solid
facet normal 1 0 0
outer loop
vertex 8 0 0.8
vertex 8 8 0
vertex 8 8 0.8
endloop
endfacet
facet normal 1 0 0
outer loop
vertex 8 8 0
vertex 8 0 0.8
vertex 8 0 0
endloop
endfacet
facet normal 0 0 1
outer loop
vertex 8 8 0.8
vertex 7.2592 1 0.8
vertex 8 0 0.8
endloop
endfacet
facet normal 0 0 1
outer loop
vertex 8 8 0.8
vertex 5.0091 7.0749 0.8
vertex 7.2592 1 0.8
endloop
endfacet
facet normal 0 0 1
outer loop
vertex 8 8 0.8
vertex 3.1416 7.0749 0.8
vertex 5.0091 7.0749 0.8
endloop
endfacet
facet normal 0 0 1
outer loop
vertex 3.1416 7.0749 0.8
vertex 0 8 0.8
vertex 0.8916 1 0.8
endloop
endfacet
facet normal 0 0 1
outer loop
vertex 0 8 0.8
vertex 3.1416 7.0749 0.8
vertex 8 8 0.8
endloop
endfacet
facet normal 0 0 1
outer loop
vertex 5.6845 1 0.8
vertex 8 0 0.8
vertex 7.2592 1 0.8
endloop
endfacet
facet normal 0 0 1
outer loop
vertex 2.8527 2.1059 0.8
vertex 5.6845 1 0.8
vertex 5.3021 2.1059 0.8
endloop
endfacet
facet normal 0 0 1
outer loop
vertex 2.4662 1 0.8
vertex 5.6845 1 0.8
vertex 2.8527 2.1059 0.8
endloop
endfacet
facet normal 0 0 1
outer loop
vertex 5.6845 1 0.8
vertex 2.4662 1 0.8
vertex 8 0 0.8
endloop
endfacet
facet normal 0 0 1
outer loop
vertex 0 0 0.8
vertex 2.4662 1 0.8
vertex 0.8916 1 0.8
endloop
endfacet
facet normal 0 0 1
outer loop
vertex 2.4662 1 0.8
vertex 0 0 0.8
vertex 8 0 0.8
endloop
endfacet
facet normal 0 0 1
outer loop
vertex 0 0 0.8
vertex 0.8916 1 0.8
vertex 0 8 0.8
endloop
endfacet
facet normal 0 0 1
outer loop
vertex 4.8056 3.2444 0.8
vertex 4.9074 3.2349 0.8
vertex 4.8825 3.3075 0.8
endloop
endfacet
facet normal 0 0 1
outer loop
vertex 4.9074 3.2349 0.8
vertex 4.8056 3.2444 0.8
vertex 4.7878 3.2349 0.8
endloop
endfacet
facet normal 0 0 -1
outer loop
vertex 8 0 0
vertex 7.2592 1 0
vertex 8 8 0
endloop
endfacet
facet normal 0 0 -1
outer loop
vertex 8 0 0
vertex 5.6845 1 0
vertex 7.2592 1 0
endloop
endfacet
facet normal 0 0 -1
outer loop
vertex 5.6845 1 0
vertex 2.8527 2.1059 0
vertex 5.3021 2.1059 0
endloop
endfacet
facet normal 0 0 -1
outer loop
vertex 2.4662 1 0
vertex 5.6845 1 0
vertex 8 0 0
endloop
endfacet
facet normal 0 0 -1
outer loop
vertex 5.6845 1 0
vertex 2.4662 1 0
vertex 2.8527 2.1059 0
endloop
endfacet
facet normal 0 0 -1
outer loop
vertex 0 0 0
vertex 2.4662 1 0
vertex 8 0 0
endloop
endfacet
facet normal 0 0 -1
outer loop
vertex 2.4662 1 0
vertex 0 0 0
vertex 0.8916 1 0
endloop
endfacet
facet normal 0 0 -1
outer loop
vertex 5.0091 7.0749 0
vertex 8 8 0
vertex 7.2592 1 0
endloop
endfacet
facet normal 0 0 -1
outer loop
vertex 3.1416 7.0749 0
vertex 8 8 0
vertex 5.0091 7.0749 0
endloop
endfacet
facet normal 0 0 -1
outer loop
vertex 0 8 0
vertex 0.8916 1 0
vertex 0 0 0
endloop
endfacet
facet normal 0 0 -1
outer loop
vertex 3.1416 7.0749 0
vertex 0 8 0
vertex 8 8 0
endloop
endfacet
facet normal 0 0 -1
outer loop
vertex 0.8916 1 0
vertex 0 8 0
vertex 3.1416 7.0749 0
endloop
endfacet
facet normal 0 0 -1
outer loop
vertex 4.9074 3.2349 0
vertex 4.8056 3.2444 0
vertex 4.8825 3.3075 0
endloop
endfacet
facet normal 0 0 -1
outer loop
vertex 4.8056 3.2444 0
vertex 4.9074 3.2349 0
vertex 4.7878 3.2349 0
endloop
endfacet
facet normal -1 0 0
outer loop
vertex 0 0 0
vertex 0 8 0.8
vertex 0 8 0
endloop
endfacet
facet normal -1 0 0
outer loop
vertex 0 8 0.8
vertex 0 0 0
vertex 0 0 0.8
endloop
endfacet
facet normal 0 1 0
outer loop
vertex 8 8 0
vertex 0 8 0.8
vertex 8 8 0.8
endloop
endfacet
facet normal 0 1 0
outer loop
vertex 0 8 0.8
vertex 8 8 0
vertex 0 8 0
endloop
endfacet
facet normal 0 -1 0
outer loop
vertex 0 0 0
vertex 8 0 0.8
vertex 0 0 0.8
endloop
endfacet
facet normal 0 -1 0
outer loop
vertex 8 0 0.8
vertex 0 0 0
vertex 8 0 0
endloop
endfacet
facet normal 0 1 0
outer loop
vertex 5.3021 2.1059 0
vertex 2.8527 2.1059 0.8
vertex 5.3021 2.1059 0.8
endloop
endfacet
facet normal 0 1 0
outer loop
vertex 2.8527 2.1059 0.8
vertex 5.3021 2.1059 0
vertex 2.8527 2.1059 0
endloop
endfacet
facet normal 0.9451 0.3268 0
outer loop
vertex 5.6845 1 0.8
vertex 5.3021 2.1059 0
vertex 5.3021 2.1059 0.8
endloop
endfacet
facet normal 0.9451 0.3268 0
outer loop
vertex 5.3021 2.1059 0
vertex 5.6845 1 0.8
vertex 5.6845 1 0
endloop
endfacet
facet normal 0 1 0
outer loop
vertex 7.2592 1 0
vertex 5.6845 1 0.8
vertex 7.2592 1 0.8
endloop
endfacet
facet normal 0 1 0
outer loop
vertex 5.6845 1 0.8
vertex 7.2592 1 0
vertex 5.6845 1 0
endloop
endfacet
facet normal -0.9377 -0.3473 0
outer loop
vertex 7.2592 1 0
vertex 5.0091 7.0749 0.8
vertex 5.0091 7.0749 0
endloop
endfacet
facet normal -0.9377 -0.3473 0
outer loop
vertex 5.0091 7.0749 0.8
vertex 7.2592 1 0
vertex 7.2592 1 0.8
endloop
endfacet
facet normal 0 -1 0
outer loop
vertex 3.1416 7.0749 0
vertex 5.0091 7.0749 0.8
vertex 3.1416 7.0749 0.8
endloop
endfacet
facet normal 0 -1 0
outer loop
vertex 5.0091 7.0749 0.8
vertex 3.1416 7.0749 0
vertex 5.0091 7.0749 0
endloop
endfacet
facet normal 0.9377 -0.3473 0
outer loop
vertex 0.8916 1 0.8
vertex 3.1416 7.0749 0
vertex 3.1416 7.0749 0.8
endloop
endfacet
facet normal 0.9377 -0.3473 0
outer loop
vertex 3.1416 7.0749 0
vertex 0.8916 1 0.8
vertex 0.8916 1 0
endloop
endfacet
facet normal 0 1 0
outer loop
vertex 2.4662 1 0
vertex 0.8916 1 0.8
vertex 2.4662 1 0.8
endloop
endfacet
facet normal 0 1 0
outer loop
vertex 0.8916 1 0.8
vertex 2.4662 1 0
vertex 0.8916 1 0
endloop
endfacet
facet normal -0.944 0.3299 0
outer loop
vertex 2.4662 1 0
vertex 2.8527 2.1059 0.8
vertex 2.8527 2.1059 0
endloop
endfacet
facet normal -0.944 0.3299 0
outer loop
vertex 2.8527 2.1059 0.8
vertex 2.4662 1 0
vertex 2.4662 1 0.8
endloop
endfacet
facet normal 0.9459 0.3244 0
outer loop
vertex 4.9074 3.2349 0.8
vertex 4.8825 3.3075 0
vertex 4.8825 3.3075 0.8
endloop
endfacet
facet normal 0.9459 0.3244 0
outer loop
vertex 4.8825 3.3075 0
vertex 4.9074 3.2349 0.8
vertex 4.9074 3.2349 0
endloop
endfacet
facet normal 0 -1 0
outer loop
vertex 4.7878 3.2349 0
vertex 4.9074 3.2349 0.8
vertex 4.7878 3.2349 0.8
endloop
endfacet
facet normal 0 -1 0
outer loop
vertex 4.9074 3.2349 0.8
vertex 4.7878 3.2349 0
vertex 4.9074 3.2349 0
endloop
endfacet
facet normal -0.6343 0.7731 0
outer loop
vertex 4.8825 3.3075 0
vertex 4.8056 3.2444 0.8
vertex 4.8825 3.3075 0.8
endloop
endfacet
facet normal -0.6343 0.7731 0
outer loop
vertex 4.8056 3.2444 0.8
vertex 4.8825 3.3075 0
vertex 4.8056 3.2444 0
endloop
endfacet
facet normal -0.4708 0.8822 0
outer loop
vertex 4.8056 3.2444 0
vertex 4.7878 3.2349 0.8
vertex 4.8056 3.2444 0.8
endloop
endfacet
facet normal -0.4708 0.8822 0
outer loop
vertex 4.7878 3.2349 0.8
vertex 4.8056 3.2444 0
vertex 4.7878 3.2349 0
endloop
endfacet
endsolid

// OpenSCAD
/* Kit Frame parts */

module kit_frame_perimeter(width, height, thickness=1.6) {
  difference() {
    cube([width, height, thickness]);
    
    translate([thickness, thickness, -1]) cube([width - 2*thickness, height - 2*thickness, thickness + 2]);
  }
}

module name_card(text, width, height, font_size, thickness=1.6) {
  difference() {
    cube([width, height, thickness / 2]);
    translate([width/2, 1, -1]) linear_extrude(thickness + 2) {
      text(text="THEFT OF FIRE", size=font_size-2, font="Roboto Slab:style=Bold", halign="center");
    }
    // O
    translate([28.8, 3, -1]) cylinder(h=thickness + 2, d=3.3, $fn=16);
    // R
    translate([43, 3.8, -1]) cylinder(h=thickness + 2, d=2.2, $fn=16);

  }
  
  translate([width/2, 7, 0.001]) {
    color("red") linear_extrude(thickness + 0.4) {
      text(text=text, size=font_size, font="Roboto Slab:style=Bold", halign="center");
    }
  }
}

module label(text, thickness=1.6) {
  w = 8;
  h = 8;

  difference() {
    cube([w, h, thickness / 2]);

    translate([w/2, 1, -1]) linear_extrude(thickness + 2) {
      text(text=text, size=6, font="Robot Slab:style=Bold", halign="center");
    }

    if (text == "4") {
      translate([2.7, 2.9, -1]) cube([2, 1.45, thickness + 1]);
      translate([3.6, 4, -1]) cube([1.2, 1.7, thickness + 1]);
    }
    if (text == "A") {
      translate([4, 4.45, -1]) cylinder(h=thickness + 1, d=2.9, $fn=32);
    }
  }
}

module rounded_bend_cap(thickness = 1.6) {
  cylinder(h = thickness, d = thickness, $fn = 16);
}

module wire(length, taper_start, taper_end, thickness=1.6) {
  // Actually one more than this after slicing.
  join_layers = 1;
  join_width = 0.6;

  difference() {
    translate([-0.01, -thickness/2, 0]) cube([length + 0.02, thickness, thickness]);

    if(taper_start) {
      translate([-0.02, 0, join_layers * 0.2]) rotate([0, -45, 0]) translate([0, -thickness/2 - 1, 0]) cube([length, thickness + 2, thickness]);
      translate([-0.02, -join_width/2, 0]) rotate([0, 0, -45]) translate([0, -thickness, -1]) cube([length, thickness, thickness + 2]);
      translate([-0.02, join_width/2, 0]) rotate([0, 0, 45]) translate([0, 0, -1]) cube([length, thickness, thickness + 2]);
    }

    if (taper_end) {
      translate([length + 0.02, 0, join_layers * 0.2]) rotate([0, 45, 0]) translate([-length, -thickness/2 - 1, 0]) cube([length, thickness + 2, thickness]);
      translate([length + 0.02, -join_width/2, 0]) rotate([0, 0, 45]) translate([-length, -thickness, -1]) cube([length, thickness, thickness + 2]);
      translate([length + 0.02, join_width/2, 0]) rotate([0, 0, -45]) translate([-length, 0, -1]) cube([length, thickness, thickness + 2]);
    }
  }
}

module white_cat_card() {
  name_card("WHITE CAT", 55, 15, 6);
}

module kasm_card() {
  name_card("KASM", 30, 10, 6);
}

module white_cat_frame(thickness = 1.6) {
  x = 30 / sqrt(2) + 1.6;

  difference() {
    kit_frame_perimeter(179.8, 178);

    translate([-0.01, -0.01, -1]) cube([x, x, thickness + 2]);
    translate([179.8 - x + 0.01, -0.01, -1]) cube([x, x, thickness + 2]);
  }
  translate([x, thickness/2, 0]) rounded_bend_cap();
  translate([thickness/2, x, 0]) rounded_bend_cap();

  translate([179.8-x, thickness/2, 0]) rounded_bend_cap();
  translate([179.8-thickness/2, x, 0]) rounded_bend_cap();

  translate([179.8-x, thickness/2, 0]) rotate([0, 0, 45]) translate([0, -thickness/2, 0]) cube([30+thickness*sin(45), thickness, thickness]);
  translate([x, thickness/2, 0]) rotate([0, 0, 135]) translate([0, -thickness/2, 0]) cube([30+thickness*sin(45), thickness, thickness]);

  translate([90 - (55/2), 1.6, 0]) white_cat_card();

  //translate([179.8 - x, 1.6, 0]) rotate([0, 0, 45]) kasm_card();
}

module frame_test() {
  kit_frame_perimeter(30, 30);
  
  translate([40, 0, 0]) rotate([0, 0, 90]) kasm_card();
  
  translate([4, 4, 0]) cube([10, 10, 1.6]);
  
  translate([0, 4+5, 0]) wire(4, false, true);
  translate([4+5, 0, 0]) rotate([0, 0, 90]) wire(4, false, true);
}

frame_test();
!label("A");

//white_cat_frame();
